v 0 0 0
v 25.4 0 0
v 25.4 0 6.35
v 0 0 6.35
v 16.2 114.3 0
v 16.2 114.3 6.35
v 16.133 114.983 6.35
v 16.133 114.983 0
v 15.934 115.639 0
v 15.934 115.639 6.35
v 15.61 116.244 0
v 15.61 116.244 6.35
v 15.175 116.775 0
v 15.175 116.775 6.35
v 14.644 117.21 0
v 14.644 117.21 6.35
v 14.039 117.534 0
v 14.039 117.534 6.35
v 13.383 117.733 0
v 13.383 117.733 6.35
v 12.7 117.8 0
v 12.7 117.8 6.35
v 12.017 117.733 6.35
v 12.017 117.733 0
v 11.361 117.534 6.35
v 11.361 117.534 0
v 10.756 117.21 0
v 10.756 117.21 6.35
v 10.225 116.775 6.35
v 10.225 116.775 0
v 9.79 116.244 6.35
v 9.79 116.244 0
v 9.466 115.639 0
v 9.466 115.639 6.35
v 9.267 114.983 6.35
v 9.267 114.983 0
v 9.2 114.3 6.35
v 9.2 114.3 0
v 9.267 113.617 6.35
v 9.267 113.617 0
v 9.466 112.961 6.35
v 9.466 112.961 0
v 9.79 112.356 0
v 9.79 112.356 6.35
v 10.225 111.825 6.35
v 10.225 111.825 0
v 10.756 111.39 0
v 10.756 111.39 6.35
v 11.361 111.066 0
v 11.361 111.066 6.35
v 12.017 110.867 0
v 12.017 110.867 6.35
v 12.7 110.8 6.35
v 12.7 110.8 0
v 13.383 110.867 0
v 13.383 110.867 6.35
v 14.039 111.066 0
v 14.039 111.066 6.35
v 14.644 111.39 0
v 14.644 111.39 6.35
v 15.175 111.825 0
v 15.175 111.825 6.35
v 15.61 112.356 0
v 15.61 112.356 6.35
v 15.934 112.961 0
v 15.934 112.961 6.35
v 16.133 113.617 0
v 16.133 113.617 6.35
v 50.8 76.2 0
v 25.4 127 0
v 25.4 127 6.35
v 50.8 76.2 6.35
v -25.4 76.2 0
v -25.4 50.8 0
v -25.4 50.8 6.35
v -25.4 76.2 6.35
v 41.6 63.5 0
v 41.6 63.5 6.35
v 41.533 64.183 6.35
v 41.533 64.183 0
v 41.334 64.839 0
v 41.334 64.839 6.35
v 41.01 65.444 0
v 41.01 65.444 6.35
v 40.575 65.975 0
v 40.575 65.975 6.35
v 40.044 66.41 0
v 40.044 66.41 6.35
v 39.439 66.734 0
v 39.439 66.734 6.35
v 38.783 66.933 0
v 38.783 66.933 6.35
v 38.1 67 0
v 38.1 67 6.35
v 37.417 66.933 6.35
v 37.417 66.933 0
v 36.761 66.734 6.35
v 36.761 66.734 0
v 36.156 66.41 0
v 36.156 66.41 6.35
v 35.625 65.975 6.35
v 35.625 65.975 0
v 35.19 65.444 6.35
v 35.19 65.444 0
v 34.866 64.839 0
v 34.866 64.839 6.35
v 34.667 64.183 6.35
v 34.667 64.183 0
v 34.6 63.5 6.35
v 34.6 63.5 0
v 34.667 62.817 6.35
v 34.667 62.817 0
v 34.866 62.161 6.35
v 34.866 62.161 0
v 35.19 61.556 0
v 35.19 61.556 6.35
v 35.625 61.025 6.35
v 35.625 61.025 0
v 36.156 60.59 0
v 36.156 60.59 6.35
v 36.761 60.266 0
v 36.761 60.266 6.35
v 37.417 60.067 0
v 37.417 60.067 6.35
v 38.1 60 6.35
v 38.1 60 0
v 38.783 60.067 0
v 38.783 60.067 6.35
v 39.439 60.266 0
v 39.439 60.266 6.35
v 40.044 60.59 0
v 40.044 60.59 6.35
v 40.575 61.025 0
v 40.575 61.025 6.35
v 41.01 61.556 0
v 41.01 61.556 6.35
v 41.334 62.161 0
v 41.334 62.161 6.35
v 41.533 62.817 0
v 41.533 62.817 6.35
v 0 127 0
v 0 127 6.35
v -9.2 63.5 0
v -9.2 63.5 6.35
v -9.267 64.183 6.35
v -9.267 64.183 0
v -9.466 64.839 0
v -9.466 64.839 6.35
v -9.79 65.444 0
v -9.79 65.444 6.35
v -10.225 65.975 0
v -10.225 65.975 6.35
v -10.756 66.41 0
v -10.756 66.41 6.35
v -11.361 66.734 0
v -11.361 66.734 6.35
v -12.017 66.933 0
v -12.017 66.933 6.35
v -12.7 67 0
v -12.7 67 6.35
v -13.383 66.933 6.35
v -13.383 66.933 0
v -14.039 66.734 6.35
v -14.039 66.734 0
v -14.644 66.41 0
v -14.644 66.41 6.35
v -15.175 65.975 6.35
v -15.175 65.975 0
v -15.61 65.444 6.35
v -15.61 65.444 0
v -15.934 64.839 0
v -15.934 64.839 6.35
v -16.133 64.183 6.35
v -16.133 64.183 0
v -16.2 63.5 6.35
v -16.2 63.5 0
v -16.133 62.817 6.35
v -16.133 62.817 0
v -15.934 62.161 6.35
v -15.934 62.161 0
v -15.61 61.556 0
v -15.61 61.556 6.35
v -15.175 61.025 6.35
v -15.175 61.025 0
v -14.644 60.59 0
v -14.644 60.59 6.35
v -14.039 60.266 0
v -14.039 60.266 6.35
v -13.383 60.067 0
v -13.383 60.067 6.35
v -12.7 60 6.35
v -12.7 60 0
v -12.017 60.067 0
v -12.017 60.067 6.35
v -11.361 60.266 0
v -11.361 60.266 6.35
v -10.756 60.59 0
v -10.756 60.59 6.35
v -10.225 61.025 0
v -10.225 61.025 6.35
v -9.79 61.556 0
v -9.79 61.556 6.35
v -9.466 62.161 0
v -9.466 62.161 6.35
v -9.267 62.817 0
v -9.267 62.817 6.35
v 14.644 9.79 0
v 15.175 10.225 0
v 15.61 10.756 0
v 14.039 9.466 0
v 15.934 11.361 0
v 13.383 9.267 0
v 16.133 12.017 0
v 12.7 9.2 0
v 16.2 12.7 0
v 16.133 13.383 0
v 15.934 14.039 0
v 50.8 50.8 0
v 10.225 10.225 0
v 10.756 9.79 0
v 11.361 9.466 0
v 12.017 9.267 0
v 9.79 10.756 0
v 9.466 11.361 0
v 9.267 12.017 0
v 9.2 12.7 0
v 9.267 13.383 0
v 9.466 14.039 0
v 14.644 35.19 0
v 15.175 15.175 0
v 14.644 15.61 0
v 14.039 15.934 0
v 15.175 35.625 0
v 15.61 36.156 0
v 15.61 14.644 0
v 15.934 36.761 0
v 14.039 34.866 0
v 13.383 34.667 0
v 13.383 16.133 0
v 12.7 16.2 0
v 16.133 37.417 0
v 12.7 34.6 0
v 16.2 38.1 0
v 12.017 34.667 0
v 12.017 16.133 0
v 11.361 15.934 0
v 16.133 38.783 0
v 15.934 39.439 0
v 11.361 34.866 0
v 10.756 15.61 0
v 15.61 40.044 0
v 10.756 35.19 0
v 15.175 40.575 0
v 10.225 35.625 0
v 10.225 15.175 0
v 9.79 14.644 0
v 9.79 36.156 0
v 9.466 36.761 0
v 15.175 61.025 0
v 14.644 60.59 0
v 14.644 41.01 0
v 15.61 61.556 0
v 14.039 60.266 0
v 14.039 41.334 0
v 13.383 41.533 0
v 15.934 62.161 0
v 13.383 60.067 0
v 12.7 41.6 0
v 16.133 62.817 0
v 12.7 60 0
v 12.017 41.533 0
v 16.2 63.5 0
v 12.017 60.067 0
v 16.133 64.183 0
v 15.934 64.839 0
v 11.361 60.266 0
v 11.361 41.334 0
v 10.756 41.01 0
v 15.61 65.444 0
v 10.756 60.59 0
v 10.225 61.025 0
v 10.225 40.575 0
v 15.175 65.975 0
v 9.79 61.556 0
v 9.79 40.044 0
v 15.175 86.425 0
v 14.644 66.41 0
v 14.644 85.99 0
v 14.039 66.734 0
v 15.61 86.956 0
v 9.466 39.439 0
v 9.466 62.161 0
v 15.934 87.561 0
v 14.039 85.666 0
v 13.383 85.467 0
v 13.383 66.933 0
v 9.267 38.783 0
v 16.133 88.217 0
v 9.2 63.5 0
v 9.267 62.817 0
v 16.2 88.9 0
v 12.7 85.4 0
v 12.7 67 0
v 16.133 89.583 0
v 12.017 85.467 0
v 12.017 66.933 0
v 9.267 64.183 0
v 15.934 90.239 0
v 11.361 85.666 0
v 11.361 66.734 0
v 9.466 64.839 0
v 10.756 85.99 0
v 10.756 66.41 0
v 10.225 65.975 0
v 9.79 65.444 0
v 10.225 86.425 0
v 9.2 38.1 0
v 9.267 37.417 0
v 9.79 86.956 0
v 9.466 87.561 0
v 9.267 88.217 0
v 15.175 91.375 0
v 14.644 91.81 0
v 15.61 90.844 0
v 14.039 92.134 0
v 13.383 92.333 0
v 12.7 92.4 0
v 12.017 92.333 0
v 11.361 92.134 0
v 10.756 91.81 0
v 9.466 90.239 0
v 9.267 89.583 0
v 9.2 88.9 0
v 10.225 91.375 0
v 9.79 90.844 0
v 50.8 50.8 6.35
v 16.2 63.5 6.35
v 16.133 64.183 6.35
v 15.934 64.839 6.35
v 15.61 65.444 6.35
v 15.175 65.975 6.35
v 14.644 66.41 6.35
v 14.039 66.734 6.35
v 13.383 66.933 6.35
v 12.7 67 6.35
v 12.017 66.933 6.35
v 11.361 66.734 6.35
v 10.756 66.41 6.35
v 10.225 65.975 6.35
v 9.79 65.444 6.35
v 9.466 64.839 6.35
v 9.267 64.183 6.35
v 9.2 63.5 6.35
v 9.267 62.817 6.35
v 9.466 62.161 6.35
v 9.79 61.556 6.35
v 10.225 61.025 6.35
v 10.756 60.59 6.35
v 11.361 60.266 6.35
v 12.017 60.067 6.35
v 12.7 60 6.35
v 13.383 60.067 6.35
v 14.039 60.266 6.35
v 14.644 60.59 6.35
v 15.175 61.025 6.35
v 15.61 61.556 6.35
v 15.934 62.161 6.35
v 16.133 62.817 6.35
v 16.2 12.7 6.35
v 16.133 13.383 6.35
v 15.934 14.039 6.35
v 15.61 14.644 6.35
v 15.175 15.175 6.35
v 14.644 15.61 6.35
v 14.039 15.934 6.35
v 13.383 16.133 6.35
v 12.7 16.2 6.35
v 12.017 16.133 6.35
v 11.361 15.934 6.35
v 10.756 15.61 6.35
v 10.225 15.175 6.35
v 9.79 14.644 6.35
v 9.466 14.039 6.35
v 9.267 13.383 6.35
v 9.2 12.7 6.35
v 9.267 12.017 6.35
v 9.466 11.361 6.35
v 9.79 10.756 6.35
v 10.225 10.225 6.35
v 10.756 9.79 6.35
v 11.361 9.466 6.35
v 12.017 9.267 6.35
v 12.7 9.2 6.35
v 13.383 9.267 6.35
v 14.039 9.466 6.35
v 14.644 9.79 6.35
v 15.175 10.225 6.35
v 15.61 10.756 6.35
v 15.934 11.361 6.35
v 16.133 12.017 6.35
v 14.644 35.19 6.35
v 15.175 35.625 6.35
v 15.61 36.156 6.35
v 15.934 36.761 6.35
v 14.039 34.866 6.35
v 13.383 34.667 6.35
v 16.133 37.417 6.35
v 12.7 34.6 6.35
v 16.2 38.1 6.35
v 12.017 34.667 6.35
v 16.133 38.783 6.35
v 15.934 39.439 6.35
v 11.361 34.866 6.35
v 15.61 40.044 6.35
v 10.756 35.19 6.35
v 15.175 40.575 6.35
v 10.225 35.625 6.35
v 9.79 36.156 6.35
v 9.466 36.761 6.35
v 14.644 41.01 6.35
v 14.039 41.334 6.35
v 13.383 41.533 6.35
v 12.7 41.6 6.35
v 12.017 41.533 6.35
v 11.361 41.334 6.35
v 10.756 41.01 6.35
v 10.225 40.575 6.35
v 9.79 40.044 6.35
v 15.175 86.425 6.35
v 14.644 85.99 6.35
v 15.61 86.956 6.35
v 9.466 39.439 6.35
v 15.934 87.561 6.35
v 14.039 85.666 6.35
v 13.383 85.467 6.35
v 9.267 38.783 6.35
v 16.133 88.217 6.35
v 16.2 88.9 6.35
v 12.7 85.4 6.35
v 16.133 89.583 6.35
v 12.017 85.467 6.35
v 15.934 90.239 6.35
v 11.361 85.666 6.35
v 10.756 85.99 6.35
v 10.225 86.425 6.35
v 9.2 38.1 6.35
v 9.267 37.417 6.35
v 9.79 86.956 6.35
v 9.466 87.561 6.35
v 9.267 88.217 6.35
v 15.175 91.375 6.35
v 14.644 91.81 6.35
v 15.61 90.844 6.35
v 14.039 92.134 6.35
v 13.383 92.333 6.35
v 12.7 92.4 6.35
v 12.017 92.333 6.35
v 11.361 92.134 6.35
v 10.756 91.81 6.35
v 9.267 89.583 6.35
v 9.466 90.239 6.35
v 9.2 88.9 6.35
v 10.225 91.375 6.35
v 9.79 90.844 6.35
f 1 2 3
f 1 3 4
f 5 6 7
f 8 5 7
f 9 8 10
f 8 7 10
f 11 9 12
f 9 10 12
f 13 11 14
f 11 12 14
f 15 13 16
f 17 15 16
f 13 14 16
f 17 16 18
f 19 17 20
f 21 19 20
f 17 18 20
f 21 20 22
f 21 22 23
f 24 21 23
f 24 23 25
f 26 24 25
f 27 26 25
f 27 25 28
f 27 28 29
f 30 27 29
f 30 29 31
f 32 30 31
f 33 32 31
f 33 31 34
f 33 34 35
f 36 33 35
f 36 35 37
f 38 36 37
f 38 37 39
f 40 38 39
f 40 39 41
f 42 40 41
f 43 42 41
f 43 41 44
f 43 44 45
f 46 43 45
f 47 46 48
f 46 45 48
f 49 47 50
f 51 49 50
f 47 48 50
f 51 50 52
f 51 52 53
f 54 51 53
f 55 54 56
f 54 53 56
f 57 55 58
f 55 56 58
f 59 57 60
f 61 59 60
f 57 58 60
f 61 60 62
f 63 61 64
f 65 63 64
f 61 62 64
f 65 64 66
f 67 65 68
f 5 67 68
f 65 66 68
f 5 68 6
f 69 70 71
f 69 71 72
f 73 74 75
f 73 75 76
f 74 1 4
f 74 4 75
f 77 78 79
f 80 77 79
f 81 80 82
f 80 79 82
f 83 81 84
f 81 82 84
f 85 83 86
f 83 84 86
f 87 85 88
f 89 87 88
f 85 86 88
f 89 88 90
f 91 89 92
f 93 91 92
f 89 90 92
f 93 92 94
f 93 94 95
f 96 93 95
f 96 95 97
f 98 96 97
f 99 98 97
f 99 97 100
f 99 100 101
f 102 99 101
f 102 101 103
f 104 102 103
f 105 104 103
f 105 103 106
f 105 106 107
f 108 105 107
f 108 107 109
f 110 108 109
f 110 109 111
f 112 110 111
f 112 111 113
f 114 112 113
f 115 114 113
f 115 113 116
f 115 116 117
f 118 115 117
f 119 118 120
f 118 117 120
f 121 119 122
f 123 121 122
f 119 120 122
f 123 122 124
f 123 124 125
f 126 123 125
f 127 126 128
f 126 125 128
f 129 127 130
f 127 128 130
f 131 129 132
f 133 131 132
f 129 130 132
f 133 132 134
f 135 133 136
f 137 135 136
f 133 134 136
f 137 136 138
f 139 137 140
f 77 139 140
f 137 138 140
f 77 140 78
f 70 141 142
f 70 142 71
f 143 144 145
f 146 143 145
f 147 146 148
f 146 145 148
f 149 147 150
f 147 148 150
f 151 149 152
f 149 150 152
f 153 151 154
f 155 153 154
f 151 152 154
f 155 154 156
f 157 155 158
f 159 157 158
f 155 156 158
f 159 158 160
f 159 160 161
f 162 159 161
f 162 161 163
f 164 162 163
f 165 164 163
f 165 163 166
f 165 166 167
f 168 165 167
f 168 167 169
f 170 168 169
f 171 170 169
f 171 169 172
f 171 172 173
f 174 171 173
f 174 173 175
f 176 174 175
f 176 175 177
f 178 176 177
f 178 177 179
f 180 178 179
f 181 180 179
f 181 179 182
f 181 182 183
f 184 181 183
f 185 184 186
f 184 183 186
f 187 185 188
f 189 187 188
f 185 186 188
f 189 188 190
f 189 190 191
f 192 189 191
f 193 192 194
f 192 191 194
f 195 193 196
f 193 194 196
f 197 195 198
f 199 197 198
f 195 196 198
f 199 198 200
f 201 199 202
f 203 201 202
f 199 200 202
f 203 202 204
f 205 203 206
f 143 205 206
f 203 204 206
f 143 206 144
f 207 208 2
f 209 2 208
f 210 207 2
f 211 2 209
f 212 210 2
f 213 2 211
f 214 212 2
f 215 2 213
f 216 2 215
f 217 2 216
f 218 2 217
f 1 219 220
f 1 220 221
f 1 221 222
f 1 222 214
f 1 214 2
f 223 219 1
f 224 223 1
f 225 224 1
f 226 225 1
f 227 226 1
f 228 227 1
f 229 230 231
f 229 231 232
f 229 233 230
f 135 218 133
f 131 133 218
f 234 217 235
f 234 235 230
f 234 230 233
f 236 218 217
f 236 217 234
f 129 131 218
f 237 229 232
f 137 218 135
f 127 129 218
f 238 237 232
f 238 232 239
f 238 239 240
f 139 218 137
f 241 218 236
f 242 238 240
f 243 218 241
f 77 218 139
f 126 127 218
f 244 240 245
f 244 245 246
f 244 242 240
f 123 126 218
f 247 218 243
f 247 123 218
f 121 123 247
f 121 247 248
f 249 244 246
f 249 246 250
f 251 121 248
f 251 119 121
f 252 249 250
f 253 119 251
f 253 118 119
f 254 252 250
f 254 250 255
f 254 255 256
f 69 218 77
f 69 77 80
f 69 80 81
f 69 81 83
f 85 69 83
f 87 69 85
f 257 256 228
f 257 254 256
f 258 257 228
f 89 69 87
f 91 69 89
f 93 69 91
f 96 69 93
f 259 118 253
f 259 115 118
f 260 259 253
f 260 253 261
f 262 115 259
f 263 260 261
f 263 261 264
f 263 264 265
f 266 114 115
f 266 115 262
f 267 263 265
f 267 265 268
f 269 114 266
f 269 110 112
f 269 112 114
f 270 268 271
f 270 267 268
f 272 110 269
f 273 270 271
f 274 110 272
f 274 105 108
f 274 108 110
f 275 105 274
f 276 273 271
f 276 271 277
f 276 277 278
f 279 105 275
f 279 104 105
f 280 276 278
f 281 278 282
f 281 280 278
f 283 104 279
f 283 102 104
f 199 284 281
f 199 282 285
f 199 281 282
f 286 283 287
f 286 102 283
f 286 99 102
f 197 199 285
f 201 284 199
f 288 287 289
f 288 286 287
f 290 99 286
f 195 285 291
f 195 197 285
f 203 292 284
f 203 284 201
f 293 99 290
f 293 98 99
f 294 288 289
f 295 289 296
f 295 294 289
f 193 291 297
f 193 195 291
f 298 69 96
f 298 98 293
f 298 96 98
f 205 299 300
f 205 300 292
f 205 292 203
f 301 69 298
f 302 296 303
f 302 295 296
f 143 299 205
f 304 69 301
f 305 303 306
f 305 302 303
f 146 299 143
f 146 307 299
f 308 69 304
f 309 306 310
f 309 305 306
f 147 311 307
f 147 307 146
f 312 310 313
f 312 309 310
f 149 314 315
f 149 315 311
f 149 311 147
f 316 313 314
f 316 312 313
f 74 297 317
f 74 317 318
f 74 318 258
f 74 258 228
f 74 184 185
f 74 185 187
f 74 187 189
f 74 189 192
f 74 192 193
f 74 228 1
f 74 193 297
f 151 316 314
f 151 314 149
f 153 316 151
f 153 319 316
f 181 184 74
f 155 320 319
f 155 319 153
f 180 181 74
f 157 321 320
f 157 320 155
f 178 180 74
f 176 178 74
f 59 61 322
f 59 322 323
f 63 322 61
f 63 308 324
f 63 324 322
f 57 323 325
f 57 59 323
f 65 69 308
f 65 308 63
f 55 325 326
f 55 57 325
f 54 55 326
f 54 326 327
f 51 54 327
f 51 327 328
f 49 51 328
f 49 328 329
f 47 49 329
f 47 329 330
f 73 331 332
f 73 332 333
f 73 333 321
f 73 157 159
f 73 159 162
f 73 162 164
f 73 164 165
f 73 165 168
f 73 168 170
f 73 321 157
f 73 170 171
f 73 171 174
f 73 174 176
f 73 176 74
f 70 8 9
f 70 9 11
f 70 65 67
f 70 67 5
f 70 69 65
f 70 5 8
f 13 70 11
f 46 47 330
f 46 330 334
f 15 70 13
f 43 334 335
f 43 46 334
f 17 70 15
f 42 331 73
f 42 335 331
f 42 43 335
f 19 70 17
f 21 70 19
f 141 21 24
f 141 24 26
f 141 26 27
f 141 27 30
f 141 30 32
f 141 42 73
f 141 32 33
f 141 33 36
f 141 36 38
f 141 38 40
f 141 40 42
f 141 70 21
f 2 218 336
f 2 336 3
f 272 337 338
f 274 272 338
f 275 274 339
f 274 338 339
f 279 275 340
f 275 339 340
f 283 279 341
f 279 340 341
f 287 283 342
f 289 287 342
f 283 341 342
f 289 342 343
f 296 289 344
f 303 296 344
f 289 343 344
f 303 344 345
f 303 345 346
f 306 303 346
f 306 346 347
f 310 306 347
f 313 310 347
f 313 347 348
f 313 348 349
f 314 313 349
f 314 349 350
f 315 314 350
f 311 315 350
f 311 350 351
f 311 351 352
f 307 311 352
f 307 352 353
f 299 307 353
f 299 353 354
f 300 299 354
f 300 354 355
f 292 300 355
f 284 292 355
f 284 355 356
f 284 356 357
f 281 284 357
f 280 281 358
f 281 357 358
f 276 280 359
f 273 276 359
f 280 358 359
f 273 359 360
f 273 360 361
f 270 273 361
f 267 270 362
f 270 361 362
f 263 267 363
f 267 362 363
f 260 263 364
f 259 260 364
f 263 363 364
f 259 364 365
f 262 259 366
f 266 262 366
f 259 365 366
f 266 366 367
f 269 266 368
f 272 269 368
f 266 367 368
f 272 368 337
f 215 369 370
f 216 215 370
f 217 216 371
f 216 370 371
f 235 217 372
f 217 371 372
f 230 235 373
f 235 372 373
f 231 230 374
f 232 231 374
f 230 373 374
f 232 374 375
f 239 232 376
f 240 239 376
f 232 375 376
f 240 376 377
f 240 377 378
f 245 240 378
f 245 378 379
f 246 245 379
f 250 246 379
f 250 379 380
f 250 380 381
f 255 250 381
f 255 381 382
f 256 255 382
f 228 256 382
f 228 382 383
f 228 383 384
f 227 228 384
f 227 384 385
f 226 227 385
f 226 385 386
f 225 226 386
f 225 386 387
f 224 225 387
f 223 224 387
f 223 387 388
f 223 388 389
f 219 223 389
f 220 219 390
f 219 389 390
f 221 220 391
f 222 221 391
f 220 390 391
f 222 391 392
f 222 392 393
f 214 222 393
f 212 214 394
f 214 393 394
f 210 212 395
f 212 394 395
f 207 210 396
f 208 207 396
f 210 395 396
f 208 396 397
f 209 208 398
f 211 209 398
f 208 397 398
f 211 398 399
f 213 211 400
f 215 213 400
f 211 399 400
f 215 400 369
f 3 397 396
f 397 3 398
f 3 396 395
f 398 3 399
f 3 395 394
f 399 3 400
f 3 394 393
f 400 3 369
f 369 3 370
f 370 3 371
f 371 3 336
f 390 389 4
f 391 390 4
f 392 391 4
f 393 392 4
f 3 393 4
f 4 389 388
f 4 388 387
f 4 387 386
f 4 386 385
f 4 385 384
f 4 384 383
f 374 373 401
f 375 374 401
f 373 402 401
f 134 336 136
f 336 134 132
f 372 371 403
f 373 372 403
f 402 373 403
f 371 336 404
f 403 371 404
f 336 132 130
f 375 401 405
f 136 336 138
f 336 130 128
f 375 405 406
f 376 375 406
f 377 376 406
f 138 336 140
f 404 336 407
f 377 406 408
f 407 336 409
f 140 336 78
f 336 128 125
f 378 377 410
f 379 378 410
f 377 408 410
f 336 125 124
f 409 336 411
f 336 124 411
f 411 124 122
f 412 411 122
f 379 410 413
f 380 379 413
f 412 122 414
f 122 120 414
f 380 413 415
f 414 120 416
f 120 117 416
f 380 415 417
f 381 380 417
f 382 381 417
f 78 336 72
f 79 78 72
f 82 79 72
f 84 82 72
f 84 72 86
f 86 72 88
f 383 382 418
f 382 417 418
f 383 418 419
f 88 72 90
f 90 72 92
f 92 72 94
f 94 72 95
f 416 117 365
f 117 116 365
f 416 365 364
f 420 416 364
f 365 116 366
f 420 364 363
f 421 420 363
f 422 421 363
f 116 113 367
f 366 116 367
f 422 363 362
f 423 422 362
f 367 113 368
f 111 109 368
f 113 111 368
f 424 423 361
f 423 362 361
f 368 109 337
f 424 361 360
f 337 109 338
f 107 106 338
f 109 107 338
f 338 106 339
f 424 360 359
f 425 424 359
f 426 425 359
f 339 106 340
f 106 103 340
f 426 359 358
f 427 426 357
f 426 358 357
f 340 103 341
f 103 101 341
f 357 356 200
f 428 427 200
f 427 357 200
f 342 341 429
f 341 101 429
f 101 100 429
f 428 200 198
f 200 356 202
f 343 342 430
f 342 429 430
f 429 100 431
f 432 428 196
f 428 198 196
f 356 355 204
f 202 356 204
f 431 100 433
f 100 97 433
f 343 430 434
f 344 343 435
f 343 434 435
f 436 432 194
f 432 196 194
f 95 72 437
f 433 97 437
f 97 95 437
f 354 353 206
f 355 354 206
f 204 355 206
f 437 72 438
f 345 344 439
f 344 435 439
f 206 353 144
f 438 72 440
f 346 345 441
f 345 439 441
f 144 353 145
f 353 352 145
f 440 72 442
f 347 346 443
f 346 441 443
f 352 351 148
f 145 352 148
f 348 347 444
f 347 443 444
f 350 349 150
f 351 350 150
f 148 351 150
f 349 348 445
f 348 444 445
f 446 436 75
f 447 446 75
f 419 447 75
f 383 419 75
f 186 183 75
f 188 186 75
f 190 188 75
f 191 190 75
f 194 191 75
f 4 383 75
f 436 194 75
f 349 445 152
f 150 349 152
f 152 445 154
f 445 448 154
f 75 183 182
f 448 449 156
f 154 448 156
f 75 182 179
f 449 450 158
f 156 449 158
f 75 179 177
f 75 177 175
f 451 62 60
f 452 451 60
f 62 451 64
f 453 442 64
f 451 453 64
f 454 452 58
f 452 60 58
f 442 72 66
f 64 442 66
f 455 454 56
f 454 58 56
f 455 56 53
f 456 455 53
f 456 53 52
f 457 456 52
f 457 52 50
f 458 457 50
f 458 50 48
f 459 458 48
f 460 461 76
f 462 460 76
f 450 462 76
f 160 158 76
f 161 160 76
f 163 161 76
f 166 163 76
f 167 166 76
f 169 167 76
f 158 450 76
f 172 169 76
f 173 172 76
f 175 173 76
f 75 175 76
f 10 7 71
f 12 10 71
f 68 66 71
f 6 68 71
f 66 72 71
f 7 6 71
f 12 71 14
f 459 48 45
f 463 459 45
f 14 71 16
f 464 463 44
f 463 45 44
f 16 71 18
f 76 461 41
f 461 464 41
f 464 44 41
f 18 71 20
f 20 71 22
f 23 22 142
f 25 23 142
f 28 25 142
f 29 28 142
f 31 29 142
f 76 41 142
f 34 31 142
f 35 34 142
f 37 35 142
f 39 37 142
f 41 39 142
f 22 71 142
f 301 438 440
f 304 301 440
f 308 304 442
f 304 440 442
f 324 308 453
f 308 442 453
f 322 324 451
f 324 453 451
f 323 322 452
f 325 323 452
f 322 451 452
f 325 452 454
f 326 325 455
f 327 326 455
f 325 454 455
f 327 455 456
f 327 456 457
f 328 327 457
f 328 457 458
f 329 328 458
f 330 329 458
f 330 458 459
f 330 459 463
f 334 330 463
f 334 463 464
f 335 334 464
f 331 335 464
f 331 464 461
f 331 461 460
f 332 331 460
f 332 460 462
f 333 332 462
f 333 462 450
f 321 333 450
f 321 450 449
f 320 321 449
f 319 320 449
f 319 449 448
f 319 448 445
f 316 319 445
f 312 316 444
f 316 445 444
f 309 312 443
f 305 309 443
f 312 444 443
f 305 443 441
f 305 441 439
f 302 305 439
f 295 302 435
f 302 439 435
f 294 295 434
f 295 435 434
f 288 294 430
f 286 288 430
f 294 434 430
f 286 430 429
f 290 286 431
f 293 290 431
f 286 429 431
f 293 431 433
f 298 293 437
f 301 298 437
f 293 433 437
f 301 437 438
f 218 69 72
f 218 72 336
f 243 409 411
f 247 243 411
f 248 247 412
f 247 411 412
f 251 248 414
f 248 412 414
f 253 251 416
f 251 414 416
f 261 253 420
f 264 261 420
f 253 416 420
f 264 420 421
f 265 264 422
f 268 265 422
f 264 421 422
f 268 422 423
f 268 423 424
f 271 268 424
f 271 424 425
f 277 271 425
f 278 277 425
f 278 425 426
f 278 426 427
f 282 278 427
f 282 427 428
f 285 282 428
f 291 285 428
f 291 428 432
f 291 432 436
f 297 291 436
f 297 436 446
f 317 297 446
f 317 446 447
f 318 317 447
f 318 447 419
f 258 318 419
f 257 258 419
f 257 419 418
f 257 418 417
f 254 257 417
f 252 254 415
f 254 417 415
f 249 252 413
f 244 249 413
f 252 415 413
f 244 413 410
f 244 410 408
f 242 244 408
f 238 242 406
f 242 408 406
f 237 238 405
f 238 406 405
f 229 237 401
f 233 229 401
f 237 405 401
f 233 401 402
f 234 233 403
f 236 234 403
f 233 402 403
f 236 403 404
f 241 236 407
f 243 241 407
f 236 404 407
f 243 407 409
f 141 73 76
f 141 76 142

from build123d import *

# Parameters (mm, degrees)
BOSS_EXTRUDE1_DEPTH = 6.35
SKETCH2_R           = 3.5
CUT_EXTRUDE1_DEPTH  = 7.35


with BuildPart() as part:
    # Sketch1 → Boss-Extrude1 (new body)
    with BuildSketch(Plane.XY):
        Polygon((-25.4, 50.8), (-25.4, 76.2), (0, 127), (25.4, 127), (50.8, 76.2), (50.8, 50.8), (25.4, 0), (0, 0), align=None)
    extrude(amount=BOSS_EXTRUDE1_DEPTH)

    # Sketch2 → Cut-Extrude1 (cut, through all)
    with BuildSketch(Plane.XY.offset(6.35)):
        with Locations((12.7, 63.5)):
            Circle(SKETCH2_R)
        with Locations((38.1, 63.5)):
            Circle(SKETCH2_R)
        with Locations((-12.7, 63.5)):
            Circle(SKETCH2_R)
        with Locations((12.7, 38.1)):
            Circle(SKETCH2_R)
        with Locations((12.7, 12.7)):
            Circle(SKETCH2_R)
        with Locations((12.7, 114.3)):
            Circle(SKETCH2_R)
        with Locations((12.7, 88.9)):
            Circle(SKETCH2_R)
    extrude(amount=-CUT_EXTRUDE1_DEPTH, mode=Mode.SUBTRACT)


solid = part.part
